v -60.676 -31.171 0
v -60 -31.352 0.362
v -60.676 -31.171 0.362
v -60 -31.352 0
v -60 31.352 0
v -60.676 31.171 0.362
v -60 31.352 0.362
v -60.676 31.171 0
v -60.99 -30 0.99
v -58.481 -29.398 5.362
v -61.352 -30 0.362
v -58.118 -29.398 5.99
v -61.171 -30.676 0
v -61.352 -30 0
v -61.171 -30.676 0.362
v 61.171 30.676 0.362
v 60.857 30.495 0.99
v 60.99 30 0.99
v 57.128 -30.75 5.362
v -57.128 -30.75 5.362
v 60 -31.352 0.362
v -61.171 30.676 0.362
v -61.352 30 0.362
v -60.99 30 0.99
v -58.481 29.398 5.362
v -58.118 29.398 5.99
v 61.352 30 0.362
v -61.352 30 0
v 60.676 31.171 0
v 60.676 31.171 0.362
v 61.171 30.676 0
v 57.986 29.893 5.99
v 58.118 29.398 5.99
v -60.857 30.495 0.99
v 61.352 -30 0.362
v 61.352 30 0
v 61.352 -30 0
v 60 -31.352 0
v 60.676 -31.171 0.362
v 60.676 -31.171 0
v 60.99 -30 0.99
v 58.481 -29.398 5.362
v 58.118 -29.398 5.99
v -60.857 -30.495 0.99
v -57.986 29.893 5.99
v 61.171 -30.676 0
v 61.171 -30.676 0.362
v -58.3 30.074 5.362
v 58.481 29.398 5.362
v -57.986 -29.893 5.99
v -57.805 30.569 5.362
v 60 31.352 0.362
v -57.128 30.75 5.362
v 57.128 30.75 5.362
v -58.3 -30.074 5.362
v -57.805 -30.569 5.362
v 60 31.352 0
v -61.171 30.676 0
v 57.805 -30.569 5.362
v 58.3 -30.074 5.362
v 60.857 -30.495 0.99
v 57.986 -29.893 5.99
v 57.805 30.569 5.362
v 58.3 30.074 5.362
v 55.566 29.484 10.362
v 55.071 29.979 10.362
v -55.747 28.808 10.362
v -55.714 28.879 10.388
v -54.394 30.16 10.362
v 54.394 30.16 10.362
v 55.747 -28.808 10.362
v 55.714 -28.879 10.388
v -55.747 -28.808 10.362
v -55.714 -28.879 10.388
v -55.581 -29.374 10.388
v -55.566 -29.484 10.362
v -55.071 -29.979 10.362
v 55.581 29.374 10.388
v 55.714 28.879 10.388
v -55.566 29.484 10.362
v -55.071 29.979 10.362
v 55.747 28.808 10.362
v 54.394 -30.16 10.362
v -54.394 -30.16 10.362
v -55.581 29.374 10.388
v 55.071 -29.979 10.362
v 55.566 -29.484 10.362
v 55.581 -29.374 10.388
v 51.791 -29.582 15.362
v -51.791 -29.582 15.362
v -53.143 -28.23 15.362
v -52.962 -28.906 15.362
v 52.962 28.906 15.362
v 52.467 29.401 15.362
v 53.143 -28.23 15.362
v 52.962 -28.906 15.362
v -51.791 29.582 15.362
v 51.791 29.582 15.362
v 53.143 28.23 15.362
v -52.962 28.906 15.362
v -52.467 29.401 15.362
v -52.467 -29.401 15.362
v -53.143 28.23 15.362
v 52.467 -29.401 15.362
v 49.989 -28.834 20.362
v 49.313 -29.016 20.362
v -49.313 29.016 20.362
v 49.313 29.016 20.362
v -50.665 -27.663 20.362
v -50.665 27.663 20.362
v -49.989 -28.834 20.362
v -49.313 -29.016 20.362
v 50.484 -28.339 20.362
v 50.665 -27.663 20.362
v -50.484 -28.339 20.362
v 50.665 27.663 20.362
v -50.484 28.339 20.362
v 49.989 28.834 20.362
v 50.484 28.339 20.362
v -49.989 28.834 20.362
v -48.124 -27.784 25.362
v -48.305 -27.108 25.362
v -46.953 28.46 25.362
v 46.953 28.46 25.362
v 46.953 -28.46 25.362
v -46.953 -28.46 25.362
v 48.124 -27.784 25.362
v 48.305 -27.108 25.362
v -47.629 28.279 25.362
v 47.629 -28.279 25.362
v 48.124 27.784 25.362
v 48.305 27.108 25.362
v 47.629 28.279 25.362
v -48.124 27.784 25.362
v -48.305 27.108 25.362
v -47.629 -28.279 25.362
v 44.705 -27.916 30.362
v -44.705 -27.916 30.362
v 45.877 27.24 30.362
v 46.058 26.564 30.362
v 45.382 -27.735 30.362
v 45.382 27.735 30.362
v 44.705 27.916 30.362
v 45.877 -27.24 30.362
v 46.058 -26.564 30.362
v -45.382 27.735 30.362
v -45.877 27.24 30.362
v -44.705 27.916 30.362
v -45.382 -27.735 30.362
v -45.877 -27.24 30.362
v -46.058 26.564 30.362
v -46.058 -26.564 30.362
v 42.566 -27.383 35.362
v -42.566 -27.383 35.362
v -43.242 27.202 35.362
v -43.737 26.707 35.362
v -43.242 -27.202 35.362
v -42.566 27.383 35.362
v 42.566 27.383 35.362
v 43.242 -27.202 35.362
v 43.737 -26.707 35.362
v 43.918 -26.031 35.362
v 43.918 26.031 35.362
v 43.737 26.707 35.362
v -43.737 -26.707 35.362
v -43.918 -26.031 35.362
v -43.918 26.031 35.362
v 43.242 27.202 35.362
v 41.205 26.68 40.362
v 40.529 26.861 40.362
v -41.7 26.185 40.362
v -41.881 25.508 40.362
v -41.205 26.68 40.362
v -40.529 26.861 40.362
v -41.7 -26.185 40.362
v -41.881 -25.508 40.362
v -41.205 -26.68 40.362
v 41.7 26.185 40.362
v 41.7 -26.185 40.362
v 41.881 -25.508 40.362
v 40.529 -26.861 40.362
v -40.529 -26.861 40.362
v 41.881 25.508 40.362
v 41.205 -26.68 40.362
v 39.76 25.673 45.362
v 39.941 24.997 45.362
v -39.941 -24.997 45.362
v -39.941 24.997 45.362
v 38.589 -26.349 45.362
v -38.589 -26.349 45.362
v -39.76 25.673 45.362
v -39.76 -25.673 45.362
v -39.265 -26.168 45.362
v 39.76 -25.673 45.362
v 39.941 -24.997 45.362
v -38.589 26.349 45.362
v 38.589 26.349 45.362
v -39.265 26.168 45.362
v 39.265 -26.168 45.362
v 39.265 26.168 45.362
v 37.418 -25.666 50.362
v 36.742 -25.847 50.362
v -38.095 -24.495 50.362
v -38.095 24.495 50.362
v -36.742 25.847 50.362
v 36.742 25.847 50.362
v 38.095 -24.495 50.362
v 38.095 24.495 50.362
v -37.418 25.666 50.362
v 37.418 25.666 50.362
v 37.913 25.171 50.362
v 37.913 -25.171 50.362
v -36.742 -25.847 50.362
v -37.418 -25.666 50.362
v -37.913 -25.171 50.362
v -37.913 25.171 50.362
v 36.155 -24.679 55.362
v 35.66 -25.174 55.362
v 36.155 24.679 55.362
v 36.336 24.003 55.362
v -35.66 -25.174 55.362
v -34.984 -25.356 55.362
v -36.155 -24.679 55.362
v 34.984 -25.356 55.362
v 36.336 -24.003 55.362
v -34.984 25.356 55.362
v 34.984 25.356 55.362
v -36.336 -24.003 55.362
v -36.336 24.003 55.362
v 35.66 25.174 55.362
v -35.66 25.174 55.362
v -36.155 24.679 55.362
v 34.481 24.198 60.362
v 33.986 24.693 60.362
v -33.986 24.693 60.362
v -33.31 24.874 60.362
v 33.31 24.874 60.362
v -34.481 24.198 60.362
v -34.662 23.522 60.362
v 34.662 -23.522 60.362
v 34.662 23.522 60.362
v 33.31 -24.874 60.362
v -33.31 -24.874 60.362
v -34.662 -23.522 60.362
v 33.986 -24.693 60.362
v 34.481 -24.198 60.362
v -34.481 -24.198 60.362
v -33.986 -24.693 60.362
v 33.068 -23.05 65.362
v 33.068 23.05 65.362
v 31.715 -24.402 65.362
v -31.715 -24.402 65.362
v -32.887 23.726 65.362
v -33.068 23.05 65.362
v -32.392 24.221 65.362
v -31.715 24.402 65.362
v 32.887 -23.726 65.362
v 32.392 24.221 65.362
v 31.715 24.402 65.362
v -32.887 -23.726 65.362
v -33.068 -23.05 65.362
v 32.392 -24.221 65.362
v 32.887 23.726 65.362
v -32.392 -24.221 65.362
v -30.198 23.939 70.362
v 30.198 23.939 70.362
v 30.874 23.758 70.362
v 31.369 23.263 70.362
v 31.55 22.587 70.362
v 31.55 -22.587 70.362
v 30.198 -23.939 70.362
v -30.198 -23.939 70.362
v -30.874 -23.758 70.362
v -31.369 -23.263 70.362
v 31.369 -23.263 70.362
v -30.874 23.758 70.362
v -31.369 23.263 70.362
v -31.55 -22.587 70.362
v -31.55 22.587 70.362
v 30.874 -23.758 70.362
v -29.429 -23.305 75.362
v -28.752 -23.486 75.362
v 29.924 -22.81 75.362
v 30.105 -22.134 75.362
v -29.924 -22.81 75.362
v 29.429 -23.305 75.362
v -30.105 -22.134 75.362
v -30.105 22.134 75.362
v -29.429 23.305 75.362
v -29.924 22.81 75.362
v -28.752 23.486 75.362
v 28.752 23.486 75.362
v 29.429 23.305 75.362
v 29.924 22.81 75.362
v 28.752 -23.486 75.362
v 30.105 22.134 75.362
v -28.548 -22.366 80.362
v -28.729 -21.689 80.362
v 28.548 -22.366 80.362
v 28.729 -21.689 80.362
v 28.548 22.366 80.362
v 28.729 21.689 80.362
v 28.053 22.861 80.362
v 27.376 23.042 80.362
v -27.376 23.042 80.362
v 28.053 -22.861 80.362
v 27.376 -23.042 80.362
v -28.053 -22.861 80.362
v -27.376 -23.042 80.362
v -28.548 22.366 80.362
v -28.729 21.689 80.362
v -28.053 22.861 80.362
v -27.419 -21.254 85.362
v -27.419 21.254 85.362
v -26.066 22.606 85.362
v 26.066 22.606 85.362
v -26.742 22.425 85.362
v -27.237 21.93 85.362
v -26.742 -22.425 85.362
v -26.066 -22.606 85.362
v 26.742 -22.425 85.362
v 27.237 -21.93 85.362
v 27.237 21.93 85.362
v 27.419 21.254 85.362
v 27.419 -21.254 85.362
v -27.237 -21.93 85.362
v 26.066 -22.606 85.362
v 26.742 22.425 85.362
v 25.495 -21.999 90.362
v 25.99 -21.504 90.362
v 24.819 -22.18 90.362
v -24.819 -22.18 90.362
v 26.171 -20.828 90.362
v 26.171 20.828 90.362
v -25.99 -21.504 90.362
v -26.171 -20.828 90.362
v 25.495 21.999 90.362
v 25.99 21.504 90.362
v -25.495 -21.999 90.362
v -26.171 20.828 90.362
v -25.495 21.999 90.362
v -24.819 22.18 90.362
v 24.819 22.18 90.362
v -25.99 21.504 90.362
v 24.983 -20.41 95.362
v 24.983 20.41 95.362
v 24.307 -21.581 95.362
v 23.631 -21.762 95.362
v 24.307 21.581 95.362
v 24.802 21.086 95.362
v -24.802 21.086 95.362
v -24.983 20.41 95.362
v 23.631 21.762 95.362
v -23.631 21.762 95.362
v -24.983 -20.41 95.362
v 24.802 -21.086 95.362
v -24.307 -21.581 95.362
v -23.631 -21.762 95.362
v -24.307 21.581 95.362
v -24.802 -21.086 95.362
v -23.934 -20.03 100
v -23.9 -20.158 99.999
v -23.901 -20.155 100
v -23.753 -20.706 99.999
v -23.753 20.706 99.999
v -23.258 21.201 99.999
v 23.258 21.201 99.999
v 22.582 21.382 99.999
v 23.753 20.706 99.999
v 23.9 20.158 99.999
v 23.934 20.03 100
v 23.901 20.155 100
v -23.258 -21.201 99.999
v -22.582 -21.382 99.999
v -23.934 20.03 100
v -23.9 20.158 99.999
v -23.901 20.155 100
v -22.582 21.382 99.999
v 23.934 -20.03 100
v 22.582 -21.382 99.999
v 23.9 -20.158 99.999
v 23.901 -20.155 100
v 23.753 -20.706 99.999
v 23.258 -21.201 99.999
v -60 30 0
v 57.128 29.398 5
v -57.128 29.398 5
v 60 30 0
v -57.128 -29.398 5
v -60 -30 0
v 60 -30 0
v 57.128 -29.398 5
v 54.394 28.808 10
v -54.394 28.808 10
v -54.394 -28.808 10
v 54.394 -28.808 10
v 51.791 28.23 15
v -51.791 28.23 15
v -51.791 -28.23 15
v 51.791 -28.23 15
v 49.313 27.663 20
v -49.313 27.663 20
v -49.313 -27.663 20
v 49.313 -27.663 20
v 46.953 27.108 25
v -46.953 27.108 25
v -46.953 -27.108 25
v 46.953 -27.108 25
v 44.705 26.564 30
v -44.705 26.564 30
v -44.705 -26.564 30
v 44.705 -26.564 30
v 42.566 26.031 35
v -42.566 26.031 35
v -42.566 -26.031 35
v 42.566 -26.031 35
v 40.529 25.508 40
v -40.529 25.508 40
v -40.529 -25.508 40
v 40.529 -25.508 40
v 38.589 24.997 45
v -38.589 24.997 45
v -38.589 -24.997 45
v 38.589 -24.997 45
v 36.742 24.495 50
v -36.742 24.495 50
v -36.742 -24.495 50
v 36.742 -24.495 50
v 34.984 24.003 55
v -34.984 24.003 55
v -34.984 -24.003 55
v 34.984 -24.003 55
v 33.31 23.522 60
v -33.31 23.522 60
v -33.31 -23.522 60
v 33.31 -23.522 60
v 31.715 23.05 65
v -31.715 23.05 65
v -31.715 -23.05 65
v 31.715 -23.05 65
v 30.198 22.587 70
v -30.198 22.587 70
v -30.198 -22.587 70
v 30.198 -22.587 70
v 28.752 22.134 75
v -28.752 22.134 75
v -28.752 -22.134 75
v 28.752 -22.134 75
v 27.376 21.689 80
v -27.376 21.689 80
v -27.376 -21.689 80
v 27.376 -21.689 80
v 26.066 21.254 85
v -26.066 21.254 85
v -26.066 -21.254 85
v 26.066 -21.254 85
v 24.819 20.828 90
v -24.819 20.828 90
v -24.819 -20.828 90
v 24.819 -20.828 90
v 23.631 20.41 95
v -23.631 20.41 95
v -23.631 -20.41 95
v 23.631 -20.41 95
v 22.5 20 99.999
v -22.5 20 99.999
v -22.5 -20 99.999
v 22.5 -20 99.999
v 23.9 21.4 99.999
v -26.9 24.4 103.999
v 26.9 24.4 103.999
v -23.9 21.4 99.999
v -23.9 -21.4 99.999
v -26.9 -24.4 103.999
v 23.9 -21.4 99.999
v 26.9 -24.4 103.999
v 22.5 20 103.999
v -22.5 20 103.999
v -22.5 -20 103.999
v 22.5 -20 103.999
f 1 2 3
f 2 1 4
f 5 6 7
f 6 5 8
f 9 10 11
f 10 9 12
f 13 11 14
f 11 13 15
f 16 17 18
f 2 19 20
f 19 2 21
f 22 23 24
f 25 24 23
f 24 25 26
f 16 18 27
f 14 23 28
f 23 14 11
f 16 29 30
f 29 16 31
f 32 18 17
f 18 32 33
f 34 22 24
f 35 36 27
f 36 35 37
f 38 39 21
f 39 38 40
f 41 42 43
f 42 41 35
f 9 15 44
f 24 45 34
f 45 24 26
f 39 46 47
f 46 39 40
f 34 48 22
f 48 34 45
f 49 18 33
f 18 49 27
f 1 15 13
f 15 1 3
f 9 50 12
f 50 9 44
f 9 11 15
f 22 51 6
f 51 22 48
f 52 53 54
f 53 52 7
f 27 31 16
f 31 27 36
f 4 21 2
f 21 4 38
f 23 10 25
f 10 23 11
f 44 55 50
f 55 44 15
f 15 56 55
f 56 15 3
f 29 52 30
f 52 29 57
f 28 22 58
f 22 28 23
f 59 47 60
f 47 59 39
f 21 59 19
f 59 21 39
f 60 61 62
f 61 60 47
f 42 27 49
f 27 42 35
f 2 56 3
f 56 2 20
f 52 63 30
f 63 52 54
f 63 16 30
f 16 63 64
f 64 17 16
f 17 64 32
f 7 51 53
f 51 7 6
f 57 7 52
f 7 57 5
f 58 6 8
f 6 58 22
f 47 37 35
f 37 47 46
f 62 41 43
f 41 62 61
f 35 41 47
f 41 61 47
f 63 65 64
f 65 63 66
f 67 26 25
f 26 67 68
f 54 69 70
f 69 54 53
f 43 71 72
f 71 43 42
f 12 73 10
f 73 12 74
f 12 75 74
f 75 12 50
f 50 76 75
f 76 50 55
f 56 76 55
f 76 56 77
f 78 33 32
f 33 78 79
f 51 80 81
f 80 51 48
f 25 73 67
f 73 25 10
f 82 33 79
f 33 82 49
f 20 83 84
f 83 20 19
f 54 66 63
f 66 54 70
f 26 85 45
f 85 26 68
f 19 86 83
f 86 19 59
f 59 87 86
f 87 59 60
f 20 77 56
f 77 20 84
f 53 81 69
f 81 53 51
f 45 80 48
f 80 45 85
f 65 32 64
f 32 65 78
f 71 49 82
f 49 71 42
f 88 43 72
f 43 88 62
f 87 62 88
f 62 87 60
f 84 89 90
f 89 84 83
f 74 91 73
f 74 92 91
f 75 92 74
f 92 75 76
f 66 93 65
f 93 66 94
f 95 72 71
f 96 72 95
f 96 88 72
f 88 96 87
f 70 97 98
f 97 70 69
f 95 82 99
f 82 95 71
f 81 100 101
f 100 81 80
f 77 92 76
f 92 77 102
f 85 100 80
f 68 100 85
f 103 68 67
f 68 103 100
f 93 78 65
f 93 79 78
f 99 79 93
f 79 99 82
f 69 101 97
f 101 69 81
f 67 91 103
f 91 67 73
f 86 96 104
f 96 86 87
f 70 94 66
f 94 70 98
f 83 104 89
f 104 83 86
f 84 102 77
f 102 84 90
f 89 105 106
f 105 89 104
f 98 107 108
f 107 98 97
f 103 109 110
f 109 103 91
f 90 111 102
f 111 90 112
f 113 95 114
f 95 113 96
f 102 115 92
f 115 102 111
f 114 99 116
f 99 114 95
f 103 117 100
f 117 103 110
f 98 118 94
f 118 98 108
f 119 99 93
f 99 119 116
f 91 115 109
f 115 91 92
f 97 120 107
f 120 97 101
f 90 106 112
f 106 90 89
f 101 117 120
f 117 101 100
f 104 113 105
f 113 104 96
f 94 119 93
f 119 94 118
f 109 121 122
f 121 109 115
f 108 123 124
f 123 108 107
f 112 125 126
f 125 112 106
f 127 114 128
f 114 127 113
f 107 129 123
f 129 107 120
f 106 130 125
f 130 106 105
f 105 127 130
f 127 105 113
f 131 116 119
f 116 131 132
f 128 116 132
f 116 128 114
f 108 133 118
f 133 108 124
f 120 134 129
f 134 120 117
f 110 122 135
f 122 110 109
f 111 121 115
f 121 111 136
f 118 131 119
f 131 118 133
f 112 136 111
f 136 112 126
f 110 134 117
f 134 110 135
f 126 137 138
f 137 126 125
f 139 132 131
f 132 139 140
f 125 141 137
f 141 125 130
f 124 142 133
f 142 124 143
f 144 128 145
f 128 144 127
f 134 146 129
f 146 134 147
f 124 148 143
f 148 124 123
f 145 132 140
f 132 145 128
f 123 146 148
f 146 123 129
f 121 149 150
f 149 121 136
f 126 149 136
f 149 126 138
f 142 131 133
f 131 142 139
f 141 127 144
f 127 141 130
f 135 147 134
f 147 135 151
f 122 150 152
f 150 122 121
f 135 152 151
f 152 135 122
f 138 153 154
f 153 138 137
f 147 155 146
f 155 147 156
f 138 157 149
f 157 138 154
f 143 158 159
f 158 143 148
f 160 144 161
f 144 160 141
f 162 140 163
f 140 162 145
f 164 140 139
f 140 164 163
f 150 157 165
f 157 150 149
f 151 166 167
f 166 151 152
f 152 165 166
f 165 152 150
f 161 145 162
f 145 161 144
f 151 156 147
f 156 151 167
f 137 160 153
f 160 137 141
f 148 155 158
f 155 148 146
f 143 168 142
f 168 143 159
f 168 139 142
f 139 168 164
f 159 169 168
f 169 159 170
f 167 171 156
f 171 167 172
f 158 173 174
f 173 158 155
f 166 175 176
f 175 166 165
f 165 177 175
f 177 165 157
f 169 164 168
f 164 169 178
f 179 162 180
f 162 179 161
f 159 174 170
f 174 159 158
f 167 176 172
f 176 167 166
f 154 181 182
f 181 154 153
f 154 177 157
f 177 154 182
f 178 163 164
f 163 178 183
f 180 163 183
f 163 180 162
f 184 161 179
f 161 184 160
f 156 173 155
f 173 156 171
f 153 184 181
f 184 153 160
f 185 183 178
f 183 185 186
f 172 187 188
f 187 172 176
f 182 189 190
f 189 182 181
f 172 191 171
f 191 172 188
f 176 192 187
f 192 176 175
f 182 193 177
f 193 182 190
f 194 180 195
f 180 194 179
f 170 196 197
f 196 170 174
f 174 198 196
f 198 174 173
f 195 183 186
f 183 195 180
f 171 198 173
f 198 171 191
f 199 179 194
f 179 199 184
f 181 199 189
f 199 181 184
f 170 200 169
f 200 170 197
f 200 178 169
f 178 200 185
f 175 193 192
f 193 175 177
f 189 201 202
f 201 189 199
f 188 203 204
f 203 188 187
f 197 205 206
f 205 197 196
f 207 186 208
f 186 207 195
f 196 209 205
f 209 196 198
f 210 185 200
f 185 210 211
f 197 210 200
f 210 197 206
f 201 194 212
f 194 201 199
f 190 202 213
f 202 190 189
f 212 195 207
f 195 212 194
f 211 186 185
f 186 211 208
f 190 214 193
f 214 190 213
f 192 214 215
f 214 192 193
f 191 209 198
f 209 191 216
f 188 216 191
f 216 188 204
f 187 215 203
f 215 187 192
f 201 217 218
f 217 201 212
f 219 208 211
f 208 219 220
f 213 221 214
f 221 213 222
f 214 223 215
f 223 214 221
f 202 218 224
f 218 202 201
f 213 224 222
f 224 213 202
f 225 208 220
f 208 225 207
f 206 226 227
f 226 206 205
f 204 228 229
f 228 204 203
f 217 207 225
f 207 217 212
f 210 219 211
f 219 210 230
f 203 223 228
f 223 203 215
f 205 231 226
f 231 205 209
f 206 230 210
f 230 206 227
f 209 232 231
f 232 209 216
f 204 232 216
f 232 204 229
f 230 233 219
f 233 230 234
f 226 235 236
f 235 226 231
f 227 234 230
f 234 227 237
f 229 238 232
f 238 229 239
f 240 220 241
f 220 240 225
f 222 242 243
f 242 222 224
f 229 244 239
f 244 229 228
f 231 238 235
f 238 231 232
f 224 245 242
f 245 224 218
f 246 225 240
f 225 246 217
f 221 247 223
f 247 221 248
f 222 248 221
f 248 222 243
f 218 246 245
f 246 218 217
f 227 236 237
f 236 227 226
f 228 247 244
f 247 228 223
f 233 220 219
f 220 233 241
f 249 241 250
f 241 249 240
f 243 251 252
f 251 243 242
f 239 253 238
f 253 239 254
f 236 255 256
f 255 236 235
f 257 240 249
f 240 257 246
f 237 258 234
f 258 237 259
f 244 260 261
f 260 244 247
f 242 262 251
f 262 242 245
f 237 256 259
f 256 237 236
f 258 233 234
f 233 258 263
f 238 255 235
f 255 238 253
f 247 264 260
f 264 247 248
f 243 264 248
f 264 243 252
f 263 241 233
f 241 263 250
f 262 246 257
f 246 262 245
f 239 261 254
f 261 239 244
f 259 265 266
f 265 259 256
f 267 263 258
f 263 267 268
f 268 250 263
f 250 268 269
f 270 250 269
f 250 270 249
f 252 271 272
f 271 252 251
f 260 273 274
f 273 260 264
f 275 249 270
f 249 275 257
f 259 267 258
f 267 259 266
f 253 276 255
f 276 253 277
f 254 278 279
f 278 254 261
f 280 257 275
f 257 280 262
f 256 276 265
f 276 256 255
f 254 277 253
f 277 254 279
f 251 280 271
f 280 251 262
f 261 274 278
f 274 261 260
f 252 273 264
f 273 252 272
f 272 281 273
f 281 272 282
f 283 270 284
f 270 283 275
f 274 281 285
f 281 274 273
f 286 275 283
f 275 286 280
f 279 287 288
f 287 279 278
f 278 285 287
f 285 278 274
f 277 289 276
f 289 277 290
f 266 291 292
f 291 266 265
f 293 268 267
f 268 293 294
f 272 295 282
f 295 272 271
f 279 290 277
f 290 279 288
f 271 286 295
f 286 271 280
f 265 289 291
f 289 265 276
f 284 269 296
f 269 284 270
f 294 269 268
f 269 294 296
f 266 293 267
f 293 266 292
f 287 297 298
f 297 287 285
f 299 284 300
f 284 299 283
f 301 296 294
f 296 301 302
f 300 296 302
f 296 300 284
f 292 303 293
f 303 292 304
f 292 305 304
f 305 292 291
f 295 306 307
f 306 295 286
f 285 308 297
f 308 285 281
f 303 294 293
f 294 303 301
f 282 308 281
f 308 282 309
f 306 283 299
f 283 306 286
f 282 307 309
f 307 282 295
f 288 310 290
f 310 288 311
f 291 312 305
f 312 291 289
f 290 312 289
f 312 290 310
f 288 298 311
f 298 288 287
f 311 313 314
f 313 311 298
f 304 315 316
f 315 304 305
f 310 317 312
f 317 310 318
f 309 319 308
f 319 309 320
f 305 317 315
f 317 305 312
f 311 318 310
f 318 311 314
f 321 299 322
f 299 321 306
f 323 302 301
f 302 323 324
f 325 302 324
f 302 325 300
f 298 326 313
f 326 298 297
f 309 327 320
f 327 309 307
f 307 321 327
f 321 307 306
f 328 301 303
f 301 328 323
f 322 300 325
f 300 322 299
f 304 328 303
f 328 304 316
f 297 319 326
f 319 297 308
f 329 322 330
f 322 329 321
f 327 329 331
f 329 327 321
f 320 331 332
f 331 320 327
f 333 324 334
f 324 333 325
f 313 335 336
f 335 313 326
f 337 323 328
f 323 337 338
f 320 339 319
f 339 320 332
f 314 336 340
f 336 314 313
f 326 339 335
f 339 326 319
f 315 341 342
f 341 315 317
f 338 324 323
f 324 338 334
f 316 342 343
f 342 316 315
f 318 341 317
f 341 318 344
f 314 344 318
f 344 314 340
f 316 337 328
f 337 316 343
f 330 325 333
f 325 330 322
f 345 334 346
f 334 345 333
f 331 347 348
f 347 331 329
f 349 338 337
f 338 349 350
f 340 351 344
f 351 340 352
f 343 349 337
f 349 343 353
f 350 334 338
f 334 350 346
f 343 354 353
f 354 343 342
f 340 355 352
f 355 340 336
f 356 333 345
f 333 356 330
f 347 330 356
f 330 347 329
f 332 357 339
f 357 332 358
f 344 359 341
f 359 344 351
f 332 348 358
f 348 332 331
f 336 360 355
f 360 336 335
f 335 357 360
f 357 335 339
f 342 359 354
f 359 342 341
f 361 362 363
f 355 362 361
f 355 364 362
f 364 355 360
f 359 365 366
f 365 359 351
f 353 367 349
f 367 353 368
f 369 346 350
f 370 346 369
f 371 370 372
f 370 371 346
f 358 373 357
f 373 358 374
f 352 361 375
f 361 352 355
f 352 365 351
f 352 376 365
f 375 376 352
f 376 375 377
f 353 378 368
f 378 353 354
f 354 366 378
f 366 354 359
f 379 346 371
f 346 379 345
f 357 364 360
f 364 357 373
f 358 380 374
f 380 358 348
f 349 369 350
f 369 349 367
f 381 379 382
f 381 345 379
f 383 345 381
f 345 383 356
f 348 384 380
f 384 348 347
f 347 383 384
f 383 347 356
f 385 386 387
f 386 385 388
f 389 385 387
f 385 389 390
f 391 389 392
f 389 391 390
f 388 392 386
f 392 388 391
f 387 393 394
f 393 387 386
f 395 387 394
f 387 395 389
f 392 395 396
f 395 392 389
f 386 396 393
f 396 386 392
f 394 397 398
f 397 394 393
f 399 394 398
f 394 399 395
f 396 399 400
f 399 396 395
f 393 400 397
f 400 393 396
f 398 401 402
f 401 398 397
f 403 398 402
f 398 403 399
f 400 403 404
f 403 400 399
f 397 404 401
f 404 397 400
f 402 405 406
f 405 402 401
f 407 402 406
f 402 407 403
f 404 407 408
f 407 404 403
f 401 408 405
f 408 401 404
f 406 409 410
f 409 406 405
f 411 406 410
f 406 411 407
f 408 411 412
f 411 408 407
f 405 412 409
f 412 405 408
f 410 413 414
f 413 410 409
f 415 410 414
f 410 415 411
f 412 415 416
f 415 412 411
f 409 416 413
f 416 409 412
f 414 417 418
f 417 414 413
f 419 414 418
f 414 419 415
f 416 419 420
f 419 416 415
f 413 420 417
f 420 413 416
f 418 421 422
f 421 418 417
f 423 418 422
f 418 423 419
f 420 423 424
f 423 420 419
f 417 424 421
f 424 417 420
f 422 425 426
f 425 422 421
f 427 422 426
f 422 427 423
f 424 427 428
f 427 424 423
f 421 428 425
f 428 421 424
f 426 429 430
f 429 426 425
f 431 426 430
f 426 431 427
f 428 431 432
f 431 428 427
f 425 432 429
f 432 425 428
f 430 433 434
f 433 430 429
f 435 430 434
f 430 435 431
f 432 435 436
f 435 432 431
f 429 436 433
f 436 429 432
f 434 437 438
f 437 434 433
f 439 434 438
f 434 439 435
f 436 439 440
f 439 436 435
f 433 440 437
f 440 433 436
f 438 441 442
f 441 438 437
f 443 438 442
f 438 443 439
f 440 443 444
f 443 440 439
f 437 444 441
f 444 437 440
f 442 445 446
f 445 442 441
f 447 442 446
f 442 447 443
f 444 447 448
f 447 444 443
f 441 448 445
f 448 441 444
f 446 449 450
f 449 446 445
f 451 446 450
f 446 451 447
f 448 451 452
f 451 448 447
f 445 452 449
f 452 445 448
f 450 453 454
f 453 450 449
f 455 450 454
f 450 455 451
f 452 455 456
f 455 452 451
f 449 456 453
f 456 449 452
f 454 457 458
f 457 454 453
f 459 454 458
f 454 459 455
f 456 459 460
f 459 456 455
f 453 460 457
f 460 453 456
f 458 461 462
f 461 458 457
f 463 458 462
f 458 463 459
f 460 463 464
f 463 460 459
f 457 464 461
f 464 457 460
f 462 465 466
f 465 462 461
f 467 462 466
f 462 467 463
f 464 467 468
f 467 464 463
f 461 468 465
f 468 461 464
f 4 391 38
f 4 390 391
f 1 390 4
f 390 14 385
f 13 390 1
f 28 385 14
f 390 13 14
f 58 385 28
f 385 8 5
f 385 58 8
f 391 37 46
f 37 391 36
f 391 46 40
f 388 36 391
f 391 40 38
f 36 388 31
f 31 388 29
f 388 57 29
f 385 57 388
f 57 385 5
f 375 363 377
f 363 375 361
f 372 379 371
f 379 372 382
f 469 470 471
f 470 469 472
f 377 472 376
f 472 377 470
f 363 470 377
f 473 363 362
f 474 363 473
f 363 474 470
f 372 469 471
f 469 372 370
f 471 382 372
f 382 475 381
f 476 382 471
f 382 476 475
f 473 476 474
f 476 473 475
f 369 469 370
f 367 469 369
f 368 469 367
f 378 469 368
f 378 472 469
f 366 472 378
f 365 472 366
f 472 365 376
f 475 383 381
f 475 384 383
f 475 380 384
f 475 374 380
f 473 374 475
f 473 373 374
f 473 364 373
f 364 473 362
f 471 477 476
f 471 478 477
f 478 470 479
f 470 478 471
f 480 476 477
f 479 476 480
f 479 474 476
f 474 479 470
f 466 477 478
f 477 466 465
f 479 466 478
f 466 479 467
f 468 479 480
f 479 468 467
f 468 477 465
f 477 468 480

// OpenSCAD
// file: horn.scad
use <tubemesh.scad>;

module dummy(){}

module horn(throat=[45,40], mouth=[120,60], length=100, wallThickness=1.4, numSections=20, flangeLength=4, flangeFlare=3, rectangular=true, solidFlangeOnly=false) {
    
    function getExponent(ratio) = pow(ratio, 1/length);
    
    mouthWidth = len(mouth)==2 ? mouth[0] : mouth;
    mouthHeight = len(mouth)==2 ? mouth[1] : mouth;
    throatWidth = len(throat)==2 ? throat[0] : throat;
    throatHeight = len(throat)==2 ? throat[1] : throat;

    wExp = getExponent(mouthWidth/throatWidth);
    hExp = getExponent(mouthHeight/throatHeight);
    
    function section(x,y,z) = 
        rectangular ? 
            [ [x,y,z], [-x,y,z], [-x,-y,z], [x,-y,z] ]:
            [ for(t=[0:10:350]) [x*cos(t), y*sin(t), z]];
            
    sections = 
        [ for(i=[0:numSections])
            let(z=i/numSections*length,
                x=pow(wExp,length-z)*throatWidth/2,
                y=pow(hExp,length-z)*throatHeight/2)
            section(x,y,z) ];

    module hornShape() {
        data = pointsAndFaces(sections,startCap=true,endCap=true,optimize=true);   
        polyhedron(points=data[0], faces=data[1]);
    }

/*    module hornShellQuick() {
        render(convexity=2)
        difference() {
            scale([(mouthWidth+wallThickness*2)/mouthWidth,(mouthHeight+wallThickness*2)/mouthHeight,1]) hornShape();
        }
    } */

    module hornShellGood() {
        render(convexity=2)
        intersection() {
            difference() {
                minkowski() {
                    hornShape();
                    sphere(r=wallThickness,$fn=12);
                }
                hornShape();
            }
            translate([-mouthWidth/2-wallThickness,-mouthHeight/2-wallThickness,0])
            cube([mouthWidth+2*wallThickness,mouthHeight+2*wallThickness,length]);
        }
    }

    module flange(hollow=true) {
        if (flangeLength>0) {
            x1 = throatWidth/2+wallThickness;
            y1 = throatHeight/2+wallThickness;
            x2 = x1 + flangeFlare;
            y2 = y1 + flangeFlare;
            render(convexity=2)
            difference() {
                morphExtrude(section(x1,y1,0), section(x2,y2,flangeLength),numSlices=1);
                if (hollow) 
                    morphExtrude(section(throatWidth/2,throatHeight/2,-1), section(throatWidth/2,throatHeight/2,flangeLength+1),numSlices=1);
            }
        }
    }

    if (!solidFlangeOnly)
        hornShellGood();
    translate([0,0,solidFlangeOnly?0:length-0.001]) flange(hollow=!solidFlangeOnly);
}
// main file
use <horn.scad>;

//<params>
length = 100;
throatWidth = 45;
throatHeight = 40;
mouthWidth = 120;
mouthHeight = 60;
wallThickness = 1.4;
numSections = 20;
flangeLength = 4;
flangeFlare = 3;
rectangular = 1; // [1:yes, 0:no]
//</params>

horn(length=length, throat=[throatWidth,throatHeight], mouth=[mouthWidth,mouthHeight], wallThickness=wallThickness, numSections=numSections, flangeLength=flangeLength, flangeFlare=flangeFlare, rectangular=rectangular);
